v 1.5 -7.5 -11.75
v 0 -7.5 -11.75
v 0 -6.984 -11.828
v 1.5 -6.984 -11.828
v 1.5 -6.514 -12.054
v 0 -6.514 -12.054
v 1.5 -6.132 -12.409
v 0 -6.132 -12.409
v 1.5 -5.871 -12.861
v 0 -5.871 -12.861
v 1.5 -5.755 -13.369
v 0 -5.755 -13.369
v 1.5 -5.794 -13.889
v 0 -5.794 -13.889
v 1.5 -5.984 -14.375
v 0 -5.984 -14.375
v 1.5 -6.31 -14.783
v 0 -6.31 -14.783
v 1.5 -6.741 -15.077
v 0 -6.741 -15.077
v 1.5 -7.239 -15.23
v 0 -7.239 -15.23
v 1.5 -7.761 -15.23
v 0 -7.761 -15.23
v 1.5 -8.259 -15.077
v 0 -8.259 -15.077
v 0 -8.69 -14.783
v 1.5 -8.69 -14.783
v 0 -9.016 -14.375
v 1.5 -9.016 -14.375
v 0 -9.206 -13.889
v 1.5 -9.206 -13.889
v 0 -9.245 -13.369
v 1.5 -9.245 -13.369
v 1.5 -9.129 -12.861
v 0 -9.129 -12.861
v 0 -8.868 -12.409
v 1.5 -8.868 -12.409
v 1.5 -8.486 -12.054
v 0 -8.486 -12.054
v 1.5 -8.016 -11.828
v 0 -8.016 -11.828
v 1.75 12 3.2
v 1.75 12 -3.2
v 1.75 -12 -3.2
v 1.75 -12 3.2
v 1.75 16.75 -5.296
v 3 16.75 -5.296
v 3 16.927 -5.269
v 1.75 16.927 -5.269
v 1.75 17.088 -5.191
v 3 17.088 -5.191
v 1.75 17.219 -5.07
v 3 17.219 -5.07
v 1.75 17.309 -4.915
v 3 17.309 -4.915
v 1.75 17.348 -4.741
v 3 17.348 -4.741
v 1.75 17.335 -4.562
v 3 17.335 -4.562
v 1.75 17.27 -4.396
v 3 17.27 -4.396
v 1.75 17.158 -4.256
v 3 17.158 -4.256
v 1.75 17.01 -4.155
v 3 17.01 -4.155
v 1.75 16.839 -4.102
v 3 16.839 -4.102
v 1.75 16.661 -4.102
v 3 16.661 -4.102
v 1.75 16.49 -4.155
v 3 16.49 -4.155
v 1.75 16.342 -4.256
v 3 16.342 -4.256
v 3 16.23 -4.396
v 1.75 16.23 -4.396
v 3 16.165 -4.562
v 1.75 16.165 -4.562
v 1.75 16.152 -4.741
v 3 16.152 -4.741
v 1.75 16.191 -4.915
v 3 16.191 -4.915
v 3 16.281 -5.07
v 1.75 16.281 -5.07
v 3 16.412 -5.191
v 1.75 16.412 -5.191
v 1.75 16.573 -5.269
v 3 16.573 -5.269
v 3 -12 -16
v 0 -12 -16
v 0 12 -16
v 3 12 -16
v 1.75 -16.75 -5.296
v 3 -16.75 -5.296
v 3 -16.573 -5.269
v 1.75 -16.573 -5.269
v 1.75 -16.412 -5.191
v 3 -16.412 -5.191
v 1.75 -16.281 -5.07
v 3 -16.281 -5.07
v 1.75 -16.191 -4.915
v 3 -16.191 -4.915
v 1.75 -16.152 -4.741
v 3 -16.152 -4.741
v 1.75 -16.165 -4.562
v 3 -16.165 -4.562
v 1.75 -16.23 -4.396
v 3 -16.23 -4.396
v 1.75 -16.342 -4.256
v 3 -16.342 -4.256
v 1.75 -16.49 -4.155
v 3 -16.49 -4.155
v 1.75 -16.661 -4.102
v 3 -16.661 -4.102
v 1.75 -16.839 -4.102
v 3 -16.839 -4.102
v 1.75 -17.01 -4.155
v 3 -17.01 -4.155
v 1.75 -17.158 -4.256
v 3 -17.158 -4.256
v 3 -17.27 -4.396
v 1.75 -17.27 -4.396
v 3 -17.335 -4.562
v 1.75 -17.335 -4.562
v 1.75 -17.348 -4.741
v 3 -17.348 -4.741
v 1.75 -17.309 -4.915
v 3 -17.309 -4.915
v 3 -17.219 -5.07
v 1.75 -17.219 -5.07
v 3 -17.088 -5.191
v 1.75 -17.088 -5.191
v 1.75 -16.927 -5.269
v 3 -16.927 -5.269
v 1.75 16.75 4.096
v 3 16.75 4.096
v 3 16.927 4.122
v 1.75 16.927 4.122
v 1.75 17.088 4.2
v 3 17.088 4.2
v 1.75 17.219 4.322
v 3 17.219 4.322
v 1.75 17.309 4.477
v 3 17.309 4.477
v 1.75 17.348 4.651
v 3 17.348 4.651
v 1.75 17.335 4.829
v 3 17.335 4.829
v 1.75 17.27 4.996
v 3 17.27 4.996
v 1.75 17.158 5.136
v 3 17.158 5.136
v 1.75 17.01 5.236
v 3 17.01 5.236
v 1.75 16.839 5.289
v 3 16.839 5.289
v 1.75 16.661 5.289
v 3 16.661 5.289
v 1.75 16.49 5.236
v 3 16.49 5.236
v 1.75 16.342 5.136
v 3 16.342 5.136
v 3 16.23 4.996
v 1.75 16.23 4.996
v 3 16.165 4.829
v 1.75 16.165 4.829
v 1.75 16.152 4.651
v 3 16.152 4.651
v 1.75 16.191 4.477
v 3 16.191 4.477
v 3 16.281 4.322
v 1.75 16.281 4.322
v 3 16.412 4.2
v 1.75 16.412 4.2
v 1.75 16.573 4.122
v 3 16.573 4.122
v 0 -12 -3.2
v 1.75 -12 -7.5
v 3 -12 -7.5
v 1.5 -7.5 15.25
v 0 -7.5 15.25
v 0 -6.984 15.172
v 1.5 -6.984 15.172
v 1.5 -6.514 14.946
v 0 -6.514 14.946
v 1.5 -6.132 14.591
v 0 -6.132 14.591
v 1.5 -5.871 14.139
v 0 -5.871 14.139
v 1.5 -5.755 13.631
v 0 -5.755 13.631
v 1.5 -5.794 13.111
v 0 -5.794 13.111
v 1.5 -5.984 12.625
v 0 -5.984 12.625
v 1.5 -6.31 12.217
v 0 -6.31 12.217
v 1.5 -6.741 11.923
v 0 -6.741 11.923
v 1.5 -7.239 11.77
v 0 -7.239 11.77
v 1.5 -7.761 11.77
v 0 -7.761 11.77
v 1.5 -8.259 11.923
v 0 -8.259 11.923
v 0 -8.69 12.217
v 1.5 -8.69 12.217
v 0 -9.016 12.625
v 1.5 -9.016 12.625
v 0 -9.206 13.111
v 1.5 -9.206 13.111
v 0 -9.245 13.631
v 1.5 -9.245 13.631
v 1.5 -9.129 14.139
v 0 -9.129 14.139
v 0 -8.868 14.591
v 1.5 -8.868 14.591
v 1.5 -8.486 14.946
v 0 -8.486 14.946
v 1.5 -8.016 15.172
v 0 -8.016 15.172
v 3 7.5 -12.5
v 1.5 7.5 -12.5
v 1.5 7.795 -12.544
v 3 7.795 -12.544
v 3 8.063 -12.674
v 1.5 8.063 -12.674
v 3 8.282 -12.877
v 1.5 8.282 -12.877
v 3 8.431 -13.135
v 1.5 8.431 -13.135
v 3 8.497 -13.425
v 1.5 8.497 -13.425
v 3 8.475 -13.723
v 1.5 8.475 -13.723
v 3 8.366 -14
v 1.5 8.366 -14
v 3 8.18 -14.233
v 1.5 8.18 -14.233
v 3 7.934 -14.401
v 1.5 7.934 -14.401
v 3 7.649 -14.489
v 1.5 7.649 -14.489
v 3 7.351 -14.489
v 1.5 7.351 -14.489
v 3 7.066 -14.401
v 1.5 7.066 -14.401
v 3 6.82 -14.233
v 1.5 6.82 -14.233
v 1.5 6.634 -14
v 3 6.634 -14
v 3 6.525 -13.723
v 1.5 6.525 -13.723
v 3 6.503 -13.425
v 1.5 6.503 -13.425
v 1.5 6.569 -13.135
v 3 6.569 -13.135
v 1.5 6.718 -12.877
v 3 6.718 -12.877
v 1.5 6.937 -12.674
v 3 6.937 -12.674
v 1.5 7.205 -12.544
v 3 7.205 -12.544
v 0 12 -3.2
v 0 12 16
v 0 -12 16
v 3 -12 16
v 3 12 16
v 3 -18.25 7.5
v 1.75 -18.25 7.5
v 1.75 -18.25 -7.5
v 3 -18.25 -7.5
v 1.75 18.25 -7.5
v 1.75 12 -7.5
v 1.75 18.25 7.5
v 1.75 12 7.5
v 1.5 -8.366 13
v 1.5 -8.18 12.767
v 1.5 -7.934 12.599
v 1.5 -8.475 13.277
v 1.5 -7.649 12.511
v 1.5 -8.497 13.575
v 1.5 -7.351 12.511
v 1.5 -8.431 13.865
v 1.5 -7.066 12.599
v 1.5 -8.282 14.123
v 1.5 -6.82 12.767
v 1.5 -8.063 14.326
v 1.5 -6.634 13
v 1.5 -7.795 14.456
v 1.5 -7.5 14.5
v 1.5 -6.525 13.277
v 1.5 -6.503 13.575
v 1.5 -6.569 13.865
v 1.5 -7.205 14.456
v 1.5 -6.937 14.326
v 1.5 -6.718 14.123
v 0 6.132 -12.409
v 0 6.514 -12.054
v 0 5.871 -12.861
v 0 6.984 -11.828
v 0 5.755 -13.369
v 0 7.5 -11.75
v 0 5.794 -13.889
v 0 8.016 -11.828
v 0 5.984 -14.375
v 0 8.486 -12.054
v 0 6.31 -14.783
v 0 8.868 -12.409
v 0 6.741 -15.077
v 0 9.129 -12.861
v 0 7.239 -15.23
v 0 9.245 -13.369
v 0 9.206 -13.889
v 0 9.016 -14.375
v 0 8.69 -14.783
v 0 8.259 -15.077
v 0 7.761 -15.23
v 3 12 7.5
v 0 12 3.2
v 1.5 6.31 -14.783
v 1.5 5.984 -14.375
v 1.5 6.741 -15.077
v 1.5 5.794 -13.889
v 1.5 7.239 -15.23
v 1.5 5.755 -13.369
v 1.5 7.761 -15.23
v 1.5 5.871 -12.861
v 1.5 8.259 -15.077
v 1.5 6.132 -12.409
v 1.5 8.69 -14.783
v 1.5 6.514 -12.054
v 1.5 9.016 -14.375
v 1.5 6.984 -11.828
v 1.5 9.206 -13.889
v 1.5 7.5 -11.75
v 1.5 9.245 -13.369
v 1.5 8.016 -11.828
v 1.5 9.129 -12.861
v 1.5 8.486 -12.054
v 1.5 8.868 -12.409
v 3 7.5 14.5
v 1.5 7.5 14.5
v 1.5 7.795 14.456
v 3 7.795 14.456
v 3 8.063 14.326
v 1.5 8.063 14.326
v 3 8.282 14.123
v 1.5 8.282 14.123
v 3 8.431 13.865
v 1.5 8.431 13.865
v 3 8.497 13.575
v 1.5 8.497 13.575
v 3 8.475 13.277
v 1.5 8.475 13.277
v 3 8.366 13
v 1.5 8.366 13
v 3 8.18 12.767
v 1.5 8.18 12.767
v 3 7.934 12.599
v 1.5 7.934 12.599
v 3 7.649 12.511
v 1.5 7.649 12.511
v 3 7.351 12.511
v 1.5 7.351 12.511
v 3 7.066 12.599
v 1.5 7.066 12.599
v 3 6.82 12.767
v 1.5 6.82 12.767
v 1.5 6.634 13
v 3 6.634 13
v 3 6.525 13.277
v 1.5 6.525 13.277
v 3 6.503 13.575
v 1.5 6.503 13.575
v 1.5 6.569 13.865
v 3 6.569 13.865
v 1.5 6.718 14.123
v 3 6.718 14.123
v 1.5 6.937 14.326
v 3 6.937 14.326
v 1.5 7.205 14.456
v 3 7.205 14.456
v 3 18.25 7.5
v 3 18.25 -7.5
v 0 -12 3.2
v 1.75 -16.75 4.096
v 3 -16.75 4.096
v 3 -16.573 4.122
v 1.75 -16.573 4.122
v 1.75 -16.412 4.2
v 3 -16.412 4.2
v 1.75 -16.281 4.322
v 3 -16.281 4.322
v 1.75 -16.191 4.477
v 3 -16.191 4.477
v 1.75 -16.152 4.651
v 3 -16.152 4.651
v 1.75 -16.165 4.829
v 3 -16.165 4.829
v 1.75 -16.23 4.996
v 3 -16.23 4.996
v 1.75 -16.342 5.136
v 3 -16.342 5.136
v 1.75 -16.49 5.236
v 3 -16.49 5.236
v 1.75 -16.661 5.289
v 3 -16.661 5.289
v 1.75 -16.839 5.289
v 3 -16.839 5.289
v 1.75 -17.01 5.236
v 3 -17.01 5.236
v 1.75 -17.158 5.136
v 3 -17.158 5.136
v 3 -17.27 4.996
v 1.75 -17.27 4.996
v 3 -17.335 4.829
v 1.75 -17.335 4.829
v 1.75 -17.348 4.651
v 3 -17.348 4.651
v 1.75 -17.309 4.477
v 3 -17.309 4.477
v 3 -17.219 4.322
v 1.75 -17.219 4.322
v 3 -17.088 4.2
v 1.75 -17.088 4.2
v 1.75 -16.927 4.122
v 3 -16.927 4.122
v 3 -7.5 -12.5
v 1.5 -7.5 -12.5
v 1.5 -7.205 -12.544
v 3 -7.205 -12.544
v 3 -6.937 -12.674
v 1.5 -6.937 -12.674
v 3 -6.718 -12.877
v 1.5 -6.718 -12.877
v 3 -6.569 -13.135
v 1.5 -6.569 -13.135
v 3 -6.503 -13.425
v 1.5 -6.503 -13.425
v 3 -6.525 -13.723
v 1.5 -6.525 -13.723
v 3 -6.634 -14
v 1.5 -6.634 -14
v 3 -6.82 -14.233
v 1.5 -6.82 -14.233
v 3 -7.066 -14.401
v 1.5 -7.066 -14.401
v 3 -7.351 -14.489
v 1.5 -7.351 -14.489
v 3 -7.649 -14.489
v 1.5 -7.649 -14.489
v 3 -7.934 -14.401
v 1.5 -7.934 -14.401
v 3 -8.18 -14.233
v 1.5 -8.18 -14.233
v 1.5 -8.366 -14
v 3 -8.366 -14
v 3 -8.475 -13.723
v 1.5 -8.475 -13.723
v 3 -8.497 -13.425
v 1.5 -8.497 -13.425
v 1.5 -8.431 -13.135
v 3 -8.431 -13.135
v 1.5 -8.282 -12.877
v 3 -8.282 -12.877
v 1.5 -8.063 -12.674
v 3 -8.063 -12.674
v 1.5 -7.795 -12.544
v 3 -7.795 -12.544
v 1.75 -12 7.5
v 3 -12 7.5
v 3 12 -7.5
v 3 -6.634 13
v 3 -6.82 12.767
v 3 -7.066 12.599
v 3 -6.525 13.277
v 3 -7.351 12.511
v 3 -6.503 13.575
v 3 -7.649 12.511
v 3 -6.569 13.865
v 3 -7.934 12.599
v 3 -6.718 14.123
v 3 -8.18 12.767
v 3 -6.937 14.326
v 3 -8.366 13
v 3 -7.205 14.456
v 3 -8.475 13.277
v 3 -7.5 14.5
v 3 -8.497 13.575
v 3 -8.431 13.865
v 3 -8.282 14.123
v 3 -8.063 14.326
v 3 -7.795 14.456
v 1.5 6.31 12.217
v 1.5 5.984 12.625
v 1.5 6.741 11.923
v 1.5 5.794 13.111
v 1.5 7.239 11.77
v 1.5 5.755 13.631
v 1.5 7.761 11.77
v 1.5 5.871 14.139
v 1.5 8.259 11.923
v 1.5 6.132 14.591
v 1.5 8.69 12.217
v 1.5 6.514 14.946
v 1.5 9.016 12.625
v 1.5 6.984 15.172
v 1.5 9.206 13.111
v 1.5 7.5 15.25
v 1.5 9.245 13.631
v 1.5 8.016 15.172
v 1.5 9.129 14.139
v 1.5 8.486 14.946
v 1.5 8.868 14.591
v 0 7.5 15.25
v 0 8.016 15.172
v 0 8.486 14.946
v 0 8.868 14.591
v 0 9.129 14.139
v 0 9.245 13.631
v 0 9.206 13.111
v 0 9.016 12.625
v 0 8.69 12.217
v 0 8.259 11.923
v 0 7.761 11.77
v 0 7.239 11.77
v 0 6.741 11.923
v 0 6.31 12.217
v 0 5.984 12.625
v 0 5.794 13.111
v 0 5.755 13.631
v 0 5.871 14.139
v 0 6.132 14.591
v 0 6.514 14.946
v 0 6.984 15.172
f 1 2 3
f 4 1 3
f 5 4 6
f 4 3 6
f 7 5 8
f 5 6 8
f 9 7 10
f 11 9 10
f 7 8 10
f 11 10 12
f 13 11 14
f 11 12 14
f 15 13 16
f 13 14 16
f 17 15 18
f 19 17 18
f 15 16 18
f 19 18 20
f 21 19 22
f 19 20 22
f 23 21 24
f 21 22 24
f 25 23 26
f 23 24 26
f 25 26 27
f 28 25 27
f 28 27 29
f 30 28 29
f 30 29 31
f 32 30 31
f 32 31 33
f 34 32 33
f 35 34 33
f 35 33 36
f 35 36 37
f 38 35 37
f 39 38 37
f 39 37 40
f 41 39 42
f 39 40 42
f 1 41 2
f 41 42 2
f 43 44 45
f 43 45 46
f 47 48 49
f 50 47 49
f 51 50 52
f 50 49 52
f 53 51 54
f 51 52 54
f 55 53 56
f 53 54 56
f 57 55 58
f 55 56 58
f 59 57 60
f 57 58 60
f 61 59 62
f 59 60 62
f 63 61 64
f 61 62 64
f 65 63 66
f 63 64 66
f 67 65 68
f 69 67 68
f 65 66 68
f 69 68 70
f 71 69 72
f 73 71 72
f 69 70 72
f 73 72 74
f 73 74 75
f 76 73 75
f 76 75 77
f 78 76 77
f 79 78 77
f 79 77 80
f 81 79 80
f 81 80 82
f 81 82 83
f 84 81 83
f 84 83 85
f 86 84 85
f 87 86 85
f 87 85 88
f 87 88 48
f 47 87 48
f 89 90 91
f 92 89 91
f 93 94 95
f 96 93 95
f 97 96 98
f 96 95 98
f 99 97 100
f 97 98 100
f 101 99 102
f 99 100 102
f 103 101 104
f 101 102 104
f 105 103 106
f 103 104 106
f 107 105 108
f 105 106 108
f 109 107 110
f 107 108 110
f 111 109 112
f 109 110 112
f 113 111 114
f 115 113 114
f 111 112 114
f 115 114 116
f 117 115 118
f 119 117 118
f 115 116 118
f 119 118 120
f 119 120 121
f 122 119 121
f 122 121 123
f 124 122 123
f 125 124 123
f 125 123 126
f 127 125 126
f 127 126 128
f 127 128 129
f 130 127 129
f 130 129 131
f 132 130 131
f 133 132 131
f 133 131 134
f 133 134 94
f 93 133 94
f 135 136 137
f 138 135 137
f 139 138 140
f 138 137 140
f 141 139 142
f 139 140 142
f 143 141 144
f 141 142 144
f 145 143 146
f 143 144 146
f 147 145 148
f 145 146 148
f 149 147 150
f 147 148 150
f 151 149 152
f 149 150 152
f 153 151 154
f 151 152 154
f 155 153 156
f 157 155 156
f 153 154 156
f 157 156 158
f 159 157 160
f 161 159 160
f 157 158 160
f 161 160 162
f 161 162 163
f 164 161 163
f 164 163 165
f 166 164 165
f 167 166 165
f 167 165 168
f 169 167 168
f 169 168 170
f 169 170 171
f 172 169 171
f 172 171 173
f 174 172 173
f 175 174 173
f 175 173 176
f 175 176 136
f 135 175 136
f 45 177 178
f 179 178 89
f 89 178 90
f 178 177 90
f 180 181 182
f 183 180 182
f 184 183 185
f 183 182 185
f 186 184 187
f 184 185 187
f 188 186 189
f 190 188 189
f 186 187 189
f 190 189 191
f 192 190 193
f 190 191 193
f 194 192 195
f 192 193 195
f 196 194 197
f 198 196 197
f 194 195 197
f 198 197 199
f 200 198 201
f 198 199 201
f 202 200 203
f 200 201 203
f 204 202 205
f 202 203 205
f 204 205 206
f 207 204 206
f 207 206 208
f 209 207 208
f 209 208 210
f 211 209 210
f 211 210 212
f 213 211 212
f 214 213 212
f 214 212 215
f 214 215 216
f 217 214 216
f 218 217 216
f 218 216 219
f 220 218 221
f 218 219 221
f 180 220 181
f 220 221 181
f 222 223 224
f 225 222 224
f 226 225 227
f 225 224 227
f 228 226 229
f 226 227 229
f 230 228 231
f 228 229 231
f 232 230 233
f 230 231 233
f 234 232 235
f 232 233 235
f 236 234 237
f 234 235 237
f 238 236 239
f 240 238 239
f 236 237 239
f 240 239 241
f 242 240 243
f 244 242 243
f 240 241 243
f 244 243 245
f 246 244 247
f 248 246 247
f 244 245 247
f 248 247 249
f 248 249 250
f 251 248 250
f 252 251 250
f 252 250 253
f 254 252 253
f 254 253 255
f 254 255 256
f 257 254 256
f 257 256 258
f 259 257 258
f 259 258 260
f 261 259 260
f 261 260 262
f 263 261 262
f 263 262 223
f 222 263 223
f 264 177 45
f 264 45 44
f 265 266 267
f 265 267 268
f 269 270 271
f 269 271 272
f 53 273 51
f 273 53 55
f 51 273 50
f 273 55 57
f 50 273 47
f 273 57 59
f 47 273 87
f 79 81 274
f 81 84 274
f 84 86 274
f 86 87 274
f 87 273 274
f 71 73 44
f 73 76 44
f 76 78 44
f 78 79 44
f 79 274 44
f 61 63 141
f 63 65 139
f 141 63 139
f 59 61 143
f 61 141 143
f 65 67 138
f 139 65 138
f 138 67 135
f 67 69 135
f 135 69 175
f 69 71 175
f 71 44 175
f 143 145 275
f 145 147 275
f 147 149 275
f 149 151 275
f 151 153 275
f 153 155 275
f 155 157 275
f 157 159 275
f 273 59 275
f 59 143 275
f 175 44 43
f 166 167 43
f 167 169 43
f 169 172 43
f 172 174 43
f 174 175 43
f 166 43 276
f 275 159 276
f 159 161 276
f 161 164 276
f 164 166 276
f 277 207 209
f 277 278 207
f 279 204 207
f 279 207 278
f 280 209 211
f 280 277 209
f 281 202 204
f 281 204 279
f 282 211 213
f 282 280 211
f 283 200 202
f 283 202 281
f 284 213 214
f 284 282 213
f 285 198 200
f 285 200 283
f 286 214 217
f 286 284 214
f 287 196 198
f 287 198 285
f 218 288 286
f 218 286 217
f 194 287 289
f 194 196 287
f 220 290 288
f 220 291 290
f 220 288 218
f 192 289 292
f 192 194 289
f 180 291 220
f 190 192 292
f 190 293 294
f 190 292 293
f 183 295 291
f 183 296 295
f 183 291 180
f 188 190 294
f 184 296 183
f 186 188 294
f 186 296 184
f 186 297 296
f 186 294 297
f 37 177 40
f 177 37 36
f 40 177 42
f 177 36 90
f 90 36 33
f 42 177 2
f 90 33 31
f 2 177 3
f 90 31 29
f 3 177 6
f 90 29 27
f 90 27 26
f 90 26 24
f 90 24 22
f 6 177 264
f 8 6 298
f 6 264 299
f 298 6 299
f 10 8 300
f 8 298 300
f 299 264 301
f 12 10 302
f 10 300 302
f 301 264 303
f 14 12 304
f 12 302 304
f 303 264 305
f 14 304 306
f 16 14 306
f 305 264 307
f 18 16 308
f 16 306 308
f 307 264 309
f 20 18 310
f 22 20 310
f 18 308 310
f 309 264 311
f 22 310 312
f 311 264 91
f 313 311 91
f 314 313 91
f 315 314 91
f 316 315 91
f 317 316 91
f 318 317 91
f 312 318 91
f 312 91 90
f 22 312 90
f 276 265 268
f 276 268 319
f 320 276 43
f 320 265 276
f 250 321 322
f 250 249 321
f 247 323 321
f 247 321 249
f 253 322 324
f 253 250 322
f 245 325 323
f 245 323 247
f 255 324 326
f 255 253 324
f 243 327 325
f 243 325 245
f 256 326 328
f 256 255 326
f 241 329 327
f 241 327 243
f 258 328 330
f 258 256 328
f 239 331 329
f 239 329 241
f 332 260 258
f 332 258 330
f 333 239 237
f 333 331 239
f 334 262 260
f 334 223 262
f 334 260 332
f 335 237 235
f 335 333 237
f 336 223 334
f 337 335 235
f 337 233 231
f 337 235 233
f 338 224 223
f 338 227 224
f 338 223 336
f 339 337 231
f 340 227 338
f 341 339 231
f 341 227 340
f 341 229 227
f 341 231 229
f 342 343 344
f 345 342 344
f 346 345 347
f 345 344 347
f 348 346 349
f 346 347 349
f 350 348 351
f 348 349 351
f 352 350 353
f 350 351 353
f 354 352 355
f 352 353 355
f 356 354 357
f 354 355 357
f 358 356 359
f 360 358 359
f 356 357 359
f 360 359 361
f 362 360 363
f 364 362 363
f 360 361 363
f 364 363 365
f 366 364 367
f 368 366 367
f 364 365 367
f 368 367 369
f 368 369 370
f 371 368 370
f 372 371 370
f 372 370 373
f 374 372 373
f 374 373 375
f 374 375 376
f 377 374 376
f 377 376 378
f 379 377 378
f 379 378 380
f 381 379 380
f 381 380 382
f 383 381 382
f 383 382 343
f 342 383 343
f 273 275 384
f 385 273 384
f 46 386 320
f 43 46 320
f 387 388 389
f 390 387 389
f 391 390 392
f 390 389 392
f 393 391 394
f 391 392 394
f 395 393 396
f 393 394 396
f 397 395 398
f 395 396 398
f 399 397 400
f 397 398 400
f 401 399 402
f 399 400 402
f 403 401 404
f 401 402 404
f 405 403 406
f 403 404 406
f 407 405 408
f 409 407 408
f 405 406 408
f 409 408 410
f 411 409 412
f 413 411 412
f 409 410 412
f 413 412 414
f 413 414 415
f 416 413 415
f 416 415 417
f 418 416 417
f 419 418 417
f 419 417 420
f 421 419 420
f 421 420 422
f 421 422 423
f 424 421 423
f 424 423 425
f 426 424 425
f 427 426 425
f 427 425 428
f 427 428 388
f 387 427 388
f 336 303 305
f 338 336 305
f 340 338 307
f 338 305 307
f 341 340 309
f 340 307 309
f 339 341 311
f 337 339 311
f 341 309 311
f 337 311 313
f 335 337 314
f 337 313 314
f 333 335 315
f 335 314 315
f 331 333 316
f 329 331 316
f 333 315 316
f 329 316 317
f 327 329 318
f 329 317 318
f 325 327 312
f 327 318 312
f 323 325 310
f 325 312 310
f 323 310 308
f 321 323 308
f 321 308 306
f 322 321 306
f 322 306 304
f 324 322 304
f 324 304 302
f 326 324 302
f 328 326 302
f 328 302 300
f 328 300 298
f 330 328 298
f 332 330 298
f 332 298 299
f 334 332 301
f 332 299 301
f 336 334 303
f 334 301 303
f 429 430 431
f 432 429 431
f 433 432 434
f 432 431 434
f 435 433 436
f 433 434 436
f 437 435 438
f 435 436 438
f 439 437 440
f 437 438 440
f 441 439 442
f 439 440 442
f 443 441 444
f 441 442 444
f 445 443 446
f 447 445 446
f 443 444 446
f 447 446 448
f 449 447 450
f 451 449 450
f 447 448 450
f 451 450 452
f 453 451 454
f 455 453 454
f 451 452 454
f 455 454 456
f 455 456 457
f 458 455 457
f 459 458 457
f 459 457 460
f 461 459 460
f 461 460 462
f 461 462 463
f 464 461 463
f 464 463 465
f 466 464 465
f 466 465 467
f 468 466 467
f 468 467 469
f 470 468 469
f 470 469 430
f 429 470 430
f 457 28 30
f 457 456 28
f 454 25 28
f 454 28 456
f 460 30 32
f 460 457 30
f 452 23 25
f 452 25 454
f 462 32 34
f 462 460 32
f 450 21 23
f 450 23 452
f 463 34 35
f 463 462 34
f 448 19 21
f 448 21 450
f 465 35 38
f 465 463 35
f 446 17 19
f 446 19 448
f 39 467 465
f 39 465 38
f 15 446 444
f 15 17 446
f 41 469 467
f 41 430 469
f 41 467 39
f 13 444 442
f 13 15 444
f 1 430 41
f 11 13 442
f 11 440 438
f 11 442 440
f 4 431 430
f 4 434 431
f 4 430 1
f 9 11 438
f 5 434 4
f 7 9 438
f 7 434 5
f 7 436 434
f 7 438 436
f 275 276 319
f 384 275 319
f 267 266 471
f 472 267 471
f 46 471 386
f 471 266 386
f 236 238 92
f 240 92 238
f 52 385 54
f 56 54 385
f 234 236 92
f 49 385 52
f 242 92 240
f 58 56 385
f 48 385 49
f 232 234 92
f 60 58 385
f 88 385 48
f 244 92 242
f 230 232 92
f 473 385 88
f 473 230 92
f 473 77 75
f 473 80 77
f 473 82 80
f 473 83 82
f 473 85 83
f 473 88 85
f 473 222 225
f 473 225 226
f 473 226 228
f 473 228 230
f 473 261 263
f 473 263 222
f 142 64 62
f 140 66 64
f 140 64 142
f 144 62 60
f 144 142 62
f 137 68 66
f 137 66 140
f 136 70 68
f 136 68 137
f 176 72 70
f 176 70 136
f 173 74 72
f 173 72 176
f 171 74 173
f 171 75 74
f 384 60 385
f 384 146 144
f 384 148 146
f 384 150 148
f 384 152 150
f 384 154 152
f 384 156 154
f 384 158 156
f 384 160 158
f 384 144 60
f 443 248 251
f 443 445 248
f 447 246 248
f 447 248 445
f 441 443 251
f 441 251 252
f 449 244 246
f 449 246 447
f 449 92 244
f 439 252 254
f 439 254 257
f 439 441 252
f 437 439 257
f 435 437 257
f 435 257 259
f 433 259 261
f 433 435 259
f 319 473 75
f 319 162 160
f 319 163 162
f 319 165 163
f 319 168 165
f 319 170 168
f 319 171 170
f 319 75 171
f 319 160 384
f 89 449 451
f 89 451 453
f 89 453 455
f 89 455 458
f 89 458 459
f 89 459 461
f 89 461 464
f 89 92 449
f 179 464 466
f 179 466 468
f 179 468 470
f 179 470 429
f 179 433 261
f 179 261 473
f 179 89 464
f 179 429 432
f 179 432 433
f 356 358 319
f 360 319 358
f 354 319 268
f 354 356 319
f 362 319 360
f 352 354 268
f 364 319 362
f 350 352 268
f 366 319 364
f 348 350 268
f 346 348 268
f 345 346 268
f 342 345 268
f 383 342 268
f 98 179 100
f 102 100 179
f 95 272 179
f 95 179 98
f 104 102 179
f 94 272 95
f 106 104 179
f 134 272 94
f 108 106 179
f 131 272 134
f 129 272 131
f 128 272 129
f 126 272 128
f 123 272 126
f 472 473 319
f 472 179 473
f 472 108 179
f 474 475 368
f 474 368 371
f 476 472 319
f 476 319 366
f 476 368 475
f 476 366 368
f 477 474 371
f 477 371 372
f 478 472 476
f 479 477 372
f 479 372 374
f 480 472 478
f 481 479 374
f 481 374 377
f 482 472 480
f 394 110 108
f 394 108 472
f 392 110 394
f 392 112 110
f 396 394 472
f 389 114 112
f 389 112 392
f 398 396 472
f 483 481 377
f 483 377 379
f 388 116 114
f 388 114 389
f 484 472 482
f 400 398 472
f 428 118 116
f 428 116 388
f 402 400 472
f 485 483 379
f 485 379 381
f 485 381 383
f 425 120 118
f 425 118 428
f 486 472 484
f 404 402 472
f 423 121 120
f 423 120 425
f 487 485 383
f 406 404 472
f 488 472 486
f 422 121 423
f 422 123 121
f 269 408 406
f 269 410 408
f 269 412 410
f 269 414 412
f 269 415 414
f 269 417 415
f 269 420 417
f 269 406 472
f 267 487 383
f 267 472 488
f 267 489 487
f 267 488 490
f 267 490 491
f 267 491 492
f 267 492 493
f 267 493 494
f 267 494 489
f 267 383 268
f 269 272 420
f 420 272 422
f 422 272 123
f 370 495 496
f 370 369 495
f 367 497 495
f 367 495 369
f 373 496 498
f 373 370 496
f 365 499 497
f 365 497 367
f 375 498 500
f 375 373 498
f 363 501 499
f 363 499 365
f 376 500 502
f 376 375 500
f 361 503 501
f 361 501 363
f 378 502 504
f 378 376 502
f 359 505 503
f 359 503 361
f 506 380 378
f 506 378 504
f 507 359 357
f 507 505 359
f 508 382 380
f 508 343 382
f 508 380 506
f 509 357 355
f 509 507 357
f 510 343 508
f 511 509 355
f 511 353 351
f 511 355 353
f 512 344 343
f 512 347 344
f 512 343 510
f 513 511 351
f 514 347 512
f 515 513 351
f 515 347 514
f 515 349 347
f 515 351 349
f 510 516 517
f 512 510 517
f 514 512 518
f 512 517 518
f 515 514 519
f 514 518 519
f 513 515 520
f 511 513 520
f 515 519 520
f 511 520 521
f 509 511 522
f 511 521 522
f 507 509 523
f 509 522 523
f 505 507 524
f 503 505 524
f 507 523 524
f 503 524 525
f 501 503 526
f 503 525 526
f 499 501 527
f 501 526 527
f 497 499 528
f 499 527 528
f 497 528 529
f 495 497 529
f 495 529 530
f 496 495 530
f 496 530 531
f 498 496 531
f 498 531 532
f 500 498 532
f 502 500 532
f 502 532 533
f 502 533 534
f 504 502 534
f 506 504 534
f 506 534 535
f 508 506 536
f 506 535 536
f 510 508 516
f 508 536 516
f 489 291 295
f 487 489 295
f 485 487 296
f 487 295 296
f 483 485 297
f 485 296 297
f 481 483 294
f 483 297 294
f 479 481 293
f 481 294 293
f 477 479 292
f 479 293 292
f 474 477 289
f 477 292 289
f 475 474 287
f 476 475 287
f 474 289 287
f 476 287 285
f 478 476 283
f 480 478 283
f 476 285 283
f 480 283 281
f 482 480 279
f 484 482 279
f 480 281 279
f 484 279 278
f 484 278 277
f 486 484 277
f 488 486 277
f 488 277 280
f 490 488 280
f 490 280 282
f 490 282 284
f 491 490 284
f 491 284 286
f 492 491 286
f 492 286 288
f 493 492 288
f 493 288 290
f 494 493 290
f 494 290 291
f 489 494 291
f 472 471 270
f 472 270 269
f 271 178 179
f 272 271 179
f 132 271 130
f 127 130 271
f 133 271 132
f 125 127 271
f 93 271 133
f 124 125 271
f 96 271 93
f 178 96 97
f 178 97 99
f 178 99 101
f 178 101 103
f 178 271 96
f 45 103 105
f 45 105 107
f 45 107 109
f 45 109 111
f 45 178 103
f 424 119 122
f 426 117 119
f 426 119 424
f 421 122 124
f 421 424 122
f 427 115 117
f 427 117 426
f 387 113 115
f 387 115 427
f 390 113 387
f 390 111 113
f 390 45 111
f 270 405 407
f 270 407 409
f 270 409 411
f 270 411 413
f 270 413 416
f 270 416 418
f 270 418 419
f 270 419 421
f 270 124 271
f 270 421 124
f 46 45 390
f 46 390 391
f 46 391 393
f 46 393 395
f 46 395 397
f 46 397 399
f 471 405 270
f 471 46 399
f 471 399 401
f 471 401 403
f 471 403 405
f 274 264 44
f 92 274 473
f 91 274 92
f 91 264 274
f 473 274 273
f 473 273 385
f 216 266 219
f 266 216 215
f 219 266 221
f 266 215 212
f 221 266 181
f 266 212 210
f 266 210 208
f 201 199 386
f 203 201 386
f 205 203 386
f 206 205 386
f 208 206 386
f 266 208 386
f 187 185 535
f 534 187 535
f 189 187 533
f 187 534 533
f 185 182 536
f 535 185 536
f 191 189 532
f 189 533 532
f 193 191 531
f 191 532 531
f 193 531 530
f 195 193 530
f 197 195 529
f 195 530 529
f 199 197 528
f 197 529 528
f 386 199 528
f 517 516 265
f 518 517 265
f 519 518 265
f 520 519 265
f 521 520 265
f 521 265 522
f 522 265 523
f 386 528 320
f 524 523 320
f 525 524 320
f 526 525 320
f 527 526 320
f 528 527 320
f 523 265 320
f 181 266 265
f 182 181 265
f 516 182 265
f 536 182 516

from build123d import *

# Parameters (mm, degrees)
SKETCH_1_W          = 32
SKETCH_1_H          = 24
EXTRUDE_1_DEPTH     = 3
SKETCH_4_W          = 6.4
SKETCH_4_H          = 24
CUT_EXTRUDE_1_DEPTH = 1.75
SKETCH_5_W          = 1.250005523
SKETCH_5_H          = 15
EXTRUDE_2_DEPTH     = 6.25
EXTRUDE_START       = -24
SKETCH_5_2_W        = 1.250005523
SKETCH_5_2_H        = 15
EXTRUDE_3_DEPTH     = 6.25
SKETCH_6_R          = 0.6
CUT_EXTRUDE_2_DEPTH = 25.455316395
SKETCH_7_R          = 1.75
SKETCH_7_R_2        = 1
CUT_EXTRUDE_4_DEPTH = 1.5
SKETCH_7_2_R        = 1
CUT_EXTRUDE_5_DEPTH = 25.455316395


with BuildPart() as part:
    # 草图1 → 凸台-拉伸1 (new body)
    with BuildSketch(Plane(origin=(0, 0, 0), x_dir=(0, 0, -1), z_dir=(1, 0, 0))):
        Rectangle(SKETCH_1_W, SKETCH_1_H)
    extrude(amount=EXTRUDE_1_DEPTH)

    # 草图4 → 切除-拉伸1 (cut)
    with BuildSketch(Plane.ZY):
        Rectangle(SKETCH_4_W, SKETCH_4_H)
    extrude(amount=-CUT_EXTRUDE_1_DEPTH, mode=Mode.SUBTRACT)

    # 草图5 → 凸台-拉伸2 (add)
    with BuildSketch(Plane.XZ.offset(12)):
        with Locations((2.374997239, 0)):
            Rectangle(SKETCH_5_W, SKETCH_5_H)
    extrude(amount=EXTRUDE_2_DEPTH)

    # 草图5<2> → 凸台-拉伸3 (add)
    with BuildSketch(Plane.XZ.offset(12).offset(EXTRUDE_START)):
        with Locations((2.374997239, 0)):
            Rectangle(SKETCH_5_2_W, SKETCH_5_2_H)
    extrude(amount=-EXTRUDE_3_DEPTH)

    # 草图6 → 切除-拉伸2 (cut, through all)
    with BuildSketch(Plane(origin=(3, 0, 0), x_dir=(0, 0, -1), z_dir=(1, 0, 0))):
        with Locations((4.695742753, -16.75)):
            Circle(SKETCH_6_R)
        with Locations((-4.695742753, -16.75)):
            Circle(SKETCH_6_R)
        with Locations((4.695742753, 16.75)):
            Circle(SKETCH_6_R)
        with Locations((-4.695742753, 16.75)):
            Circle(SKETCH_6_R)
    extrude(amount=-CUT_EXTRUDE_2_DEPTH, mode=Mode.SUBTRACT)

    # 草图7 → 切除-拉伸4 (cut)
    # profile 1 of 4: a face of its own
    with BuildSketch(Plane.ZY):
        with Locations((13.5, 7.5)):
            Circle(SKETCH_7_R)
        with Locations((13.5, 7.5)):
            Circle(SKETCH_7_R_2, mode=Mode.SUBTRACT)
    # profile 2 of 4: a face of its own
    with BuildSketch(Plane.ZY):
        with Locations((13.5, -7.5)):
            Circle(SKETCH_7_R)
        with Locations((13.5, -7.5)):
            Circle(SKETCH_7_R_2, mode=Mode.SUBTRACT)
    # profile 3 of 4: a face of its own
    with BuildSketch(Plane.ZY):
        with Locations((-13.5, 7.5)):
            Circle(SKETCH_7_R)
        with Locations((-13.5, 7.5)):
            Circle(SKETCH_7_R_2, mode=Mode.SUBTRACT)
    # profile 4 of 4: a face of its own
    with BuildSketch(Plane.ZY):
        with Locations((-13.5, -7.5)):
            Circle(SKETCH_7_R)
        with Locations((-13.5, -7.5)):
            Circle(SKETCH_7_R_2, mode=Mode.SUBTRACT)
    extrude(amount=-CUT_EXTRUDE_4_DEPTH, mode=Mode.SUBTRACT)

    # 草图7<2> → 切除-拉伸5 (cut, through all)
    with BuildSketch(Plane.ZY):
        with Locations((13.5, 7.5)):
            Circle(SKETCH_7_2_R)
        with Locations((13.5, -7.5)):
            Circle(SKETCH_7_2_R)
        with Locations((-13.5, -7.5)):
            Circle(SKETCH_7_2_R)
        with Locations((-13.5, 7.5)):
            Circle(SKETCH_7_2_R)
    extrude(amount=-CUT_EXTRUDE_5_DEPTH, mode=Mode.SUBTRACT)


solid = part.part
